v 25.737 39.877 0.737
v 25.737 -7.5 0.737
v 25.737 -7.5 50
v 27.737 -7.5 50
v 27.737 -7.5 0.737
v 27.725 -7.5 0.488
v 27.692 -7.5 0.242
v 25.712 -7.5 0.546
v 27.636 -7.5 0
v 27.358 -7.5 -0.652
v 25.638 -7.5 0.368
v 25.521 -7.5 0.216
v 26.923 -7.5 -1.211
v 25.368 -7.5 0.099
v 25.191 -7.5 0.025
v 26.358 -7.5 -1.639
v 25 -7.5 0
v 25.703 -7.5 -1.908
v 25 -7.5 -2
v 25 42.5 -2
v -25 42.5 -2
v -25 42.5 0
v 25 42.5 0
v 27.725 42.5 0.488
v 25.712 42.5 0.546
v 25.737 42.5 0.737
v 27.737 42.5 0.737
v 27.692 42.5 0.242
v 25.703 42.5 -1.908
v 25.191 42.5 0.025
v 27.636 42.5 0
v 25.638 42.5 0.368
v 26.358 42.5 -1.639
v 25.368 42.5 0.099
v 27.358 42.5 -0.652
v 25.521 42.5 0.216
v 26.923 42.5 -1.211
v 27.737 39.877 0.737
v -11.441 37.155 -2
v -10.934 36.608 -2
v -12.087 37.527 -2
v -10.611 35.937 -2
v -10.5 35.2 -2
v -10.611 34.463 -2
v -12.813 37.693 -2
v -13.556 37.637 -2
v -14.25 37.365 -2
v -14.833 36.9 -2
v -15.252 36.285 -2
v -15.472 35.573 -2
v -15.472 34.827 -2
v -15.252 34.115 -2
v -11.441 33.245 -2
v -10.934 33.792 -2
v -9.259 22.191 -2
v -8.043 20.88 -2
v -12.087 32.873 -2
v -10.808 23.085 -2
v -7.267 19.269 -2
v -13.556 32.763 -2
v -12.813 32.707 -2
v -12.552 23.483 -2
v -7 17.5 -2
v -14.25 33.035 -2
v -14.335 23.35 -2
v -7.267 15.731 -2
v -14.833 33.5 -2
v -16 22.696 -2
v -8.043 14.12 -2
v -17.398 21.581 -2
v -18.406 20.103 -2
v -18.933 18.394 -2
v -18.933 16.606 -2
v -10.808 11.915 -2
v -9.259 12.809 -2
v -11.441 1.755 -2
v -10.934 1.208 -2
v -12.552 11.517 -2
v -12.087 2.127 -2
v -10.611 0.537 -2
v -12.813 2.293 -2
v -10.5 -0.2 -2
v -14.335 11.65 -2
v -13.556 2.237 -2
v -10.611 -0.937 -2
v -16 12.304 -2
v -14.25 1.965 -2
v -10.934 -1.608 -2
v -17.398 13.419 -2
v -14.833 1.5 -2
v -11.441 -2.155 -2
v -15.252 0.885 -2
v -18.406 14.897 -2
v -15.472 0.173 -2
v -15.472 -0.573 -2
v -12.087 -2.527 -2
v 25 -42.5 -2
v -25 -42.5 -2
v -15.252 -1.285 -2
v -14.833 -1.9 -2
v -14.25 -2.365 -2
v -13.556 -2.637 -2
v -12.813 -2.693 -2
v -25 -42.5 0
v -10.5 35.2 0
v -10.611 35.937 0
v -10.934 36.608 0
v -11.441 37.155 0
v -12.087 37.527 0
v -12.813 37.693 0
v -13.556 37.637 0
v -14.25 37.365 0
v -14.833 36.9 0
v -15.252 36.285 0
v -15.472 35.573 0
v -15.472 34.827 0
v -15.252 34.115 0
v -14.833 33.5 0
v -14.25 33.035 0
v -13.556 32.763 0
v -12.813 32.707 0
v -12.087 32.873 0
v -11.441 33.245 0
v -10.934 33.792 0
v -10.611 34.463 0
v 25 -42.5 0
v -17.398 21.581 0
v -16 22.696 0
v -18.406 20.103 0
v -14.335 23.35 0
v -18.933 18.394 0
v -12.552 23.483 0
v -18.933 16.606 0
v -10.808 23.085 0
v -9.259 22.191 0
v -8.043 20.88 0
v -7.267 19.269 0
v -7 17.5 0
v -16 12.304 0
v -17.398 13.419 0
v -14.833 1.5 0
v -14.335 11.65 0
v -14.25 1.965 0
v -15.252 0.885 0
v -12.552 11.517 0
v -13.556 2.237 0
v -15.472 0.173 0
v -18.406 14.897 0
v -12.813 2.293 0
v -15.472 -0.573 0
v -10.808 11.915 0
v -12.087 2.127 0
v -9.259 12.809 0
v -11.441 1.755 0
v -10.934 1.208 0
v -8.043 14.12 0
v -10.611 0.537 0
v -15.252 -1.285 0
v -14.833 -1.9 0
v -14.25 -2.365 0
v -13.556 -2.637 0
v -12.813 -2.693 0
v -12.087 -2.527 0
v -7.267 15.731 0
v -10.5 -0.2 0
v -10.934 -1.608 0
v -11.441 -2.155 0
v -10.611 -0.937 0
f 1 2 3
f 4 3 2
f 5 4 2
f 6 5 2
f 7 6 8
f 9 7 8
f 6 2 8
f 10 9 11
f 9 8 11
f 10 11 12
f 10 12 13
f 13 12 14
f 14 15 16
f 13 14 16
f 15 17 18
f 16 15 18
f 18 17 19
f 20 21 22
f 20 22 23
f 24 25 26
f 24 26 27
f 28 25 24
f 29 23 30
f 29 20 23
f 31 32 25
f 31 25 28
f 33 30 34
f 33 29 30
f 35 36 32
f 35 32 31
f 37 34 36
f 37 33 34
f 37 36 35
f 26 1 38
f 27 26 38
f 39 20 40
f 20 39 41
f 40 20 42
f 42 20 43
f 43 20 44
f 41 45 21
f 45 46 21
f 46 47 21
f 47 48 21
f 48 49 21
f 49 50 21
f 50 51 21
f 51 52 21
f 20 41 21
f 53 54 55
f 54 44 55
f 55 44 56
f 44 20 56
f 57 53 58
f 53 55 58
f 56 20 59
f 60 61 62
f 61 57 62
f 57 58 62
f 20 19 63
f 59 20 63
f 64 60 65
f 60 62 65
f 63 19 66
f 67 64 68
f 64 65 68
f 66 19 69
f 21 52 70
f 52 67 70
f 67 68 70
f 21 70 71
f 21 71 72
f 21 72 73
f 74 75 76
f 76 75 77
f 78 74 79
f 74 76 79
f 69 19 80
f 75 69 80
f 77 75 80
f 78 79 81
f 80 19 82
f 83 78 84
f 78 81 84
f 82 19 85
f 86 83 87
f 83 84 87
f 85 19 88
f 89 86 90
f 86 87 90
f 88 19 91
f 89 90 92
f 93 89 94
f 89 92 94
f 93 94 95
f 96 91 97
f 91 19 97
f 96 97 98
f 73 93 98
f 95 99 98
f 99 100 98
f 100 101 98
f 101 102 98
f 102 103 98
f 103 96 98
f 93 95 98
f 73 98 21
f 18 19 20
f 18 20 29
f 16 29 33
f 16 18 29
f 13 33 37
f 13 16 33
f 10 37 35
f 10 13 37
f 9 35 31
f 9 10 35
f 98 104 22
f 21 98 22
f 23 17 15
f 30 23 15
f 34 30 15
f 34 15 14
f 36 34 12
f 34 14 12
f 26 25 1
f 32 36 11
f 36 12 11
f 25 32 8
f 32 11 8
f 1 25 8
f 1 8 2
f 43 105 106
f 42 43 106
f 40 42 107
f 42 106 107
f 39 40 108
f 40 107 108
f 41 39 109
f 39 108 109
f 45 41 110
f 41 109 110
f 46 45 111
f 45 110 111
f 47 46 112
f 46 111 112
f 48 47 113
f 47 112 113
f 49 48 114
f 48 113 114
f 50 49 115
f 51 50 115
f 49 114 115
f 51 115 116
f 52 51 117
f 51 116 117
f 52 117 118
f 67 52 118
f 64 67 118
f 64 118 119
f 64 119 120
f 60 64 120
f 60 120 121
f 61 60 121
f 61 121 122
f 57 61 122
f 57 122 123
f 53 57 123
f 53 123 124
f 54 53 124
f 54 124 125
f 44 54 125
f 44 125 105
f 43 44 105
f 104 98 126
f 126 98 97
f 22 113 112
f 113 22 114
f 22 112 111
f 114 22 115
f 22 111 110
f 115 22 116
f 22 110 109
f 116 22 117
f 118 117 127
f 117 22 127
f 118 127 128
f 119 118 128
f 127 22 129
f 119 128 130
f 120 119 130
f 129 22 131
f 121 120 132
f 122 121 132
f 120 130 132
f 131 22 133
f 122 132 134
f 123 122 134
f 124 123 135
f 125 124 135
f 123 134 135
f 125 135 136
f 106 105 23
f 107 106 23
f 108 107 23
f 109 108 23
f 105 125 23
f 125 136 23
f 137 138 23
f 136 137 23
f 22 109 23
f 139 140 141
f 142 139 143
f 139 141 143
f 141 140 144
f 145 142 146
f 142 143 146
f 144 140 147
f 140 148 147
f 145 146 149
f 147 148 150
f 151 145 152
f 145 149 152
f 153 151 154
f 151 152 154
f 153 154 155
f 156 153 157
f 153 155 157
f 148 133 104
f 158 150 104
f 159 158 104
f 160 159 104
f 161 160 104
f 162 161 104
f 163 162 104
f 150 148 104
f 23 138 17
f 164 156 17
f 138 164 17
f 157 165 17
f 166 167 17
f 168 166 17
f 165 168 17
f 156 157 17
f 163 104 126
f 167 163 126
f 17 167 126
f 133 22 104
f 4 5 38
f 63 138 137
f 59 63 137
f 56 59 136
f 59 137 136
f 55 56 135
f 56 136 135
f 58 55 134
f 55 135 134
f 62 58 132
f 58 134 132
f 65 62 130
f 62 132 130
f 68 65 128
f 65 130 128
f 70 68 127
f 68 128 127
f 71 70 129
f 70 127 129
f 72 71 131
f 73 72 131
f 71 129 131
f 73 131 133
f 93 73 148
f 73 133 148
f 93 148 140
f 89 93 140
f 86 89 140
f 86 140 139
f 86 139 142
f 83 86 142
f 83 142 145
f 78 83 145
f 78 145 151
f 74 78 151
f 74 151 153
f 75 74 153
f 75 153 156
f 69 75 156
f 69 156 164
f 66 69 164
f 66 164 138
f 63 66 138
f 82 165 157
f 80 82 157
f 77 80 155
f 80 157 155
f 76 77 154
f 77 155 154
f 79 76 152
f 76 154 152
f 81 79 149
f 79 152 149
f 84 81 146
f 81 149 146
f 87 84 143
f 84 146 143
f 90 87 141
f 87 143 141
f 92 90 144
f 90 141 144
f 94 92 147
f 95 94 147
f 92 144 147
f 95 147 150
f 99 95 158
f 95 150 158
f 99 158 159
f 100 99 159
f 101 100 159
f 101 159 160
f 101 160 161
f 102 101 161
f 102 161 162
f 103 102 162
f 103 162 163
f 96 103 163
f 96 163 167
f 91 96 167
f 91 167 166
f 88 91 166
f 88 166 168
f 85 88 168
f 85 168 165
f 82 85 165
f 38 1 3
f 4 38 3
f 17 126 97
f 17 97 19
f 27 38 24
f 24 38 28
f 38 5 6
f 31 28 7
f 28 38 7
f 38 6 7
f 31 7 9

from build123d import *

# Parameters (mm, degrees)
CROQUIS1_W             = 50
CROQUIS1_H             = 85
BRIDA_BASE1_DEPTH      = 2
BRIDA_DE_ARISTA1_DEPTH = 85
DESDOBLAR1_START       = -42.5
DESDOBLAR1_DEPTH       = 85
DESDOBLAR1_2_DEPTH     = 85
CROQUIS9_W             = 49.2634
CROQUIS9_H             = 35
CROQUIS9_W_2           = 2.727844901
CORTAR_EXTRUIR1_DEPTH  = 10
DOBLAR1_START          = -7.5
DOBLAR1_DEPTH          = 50
DOBLAR1_2_DEPTH        = 50
DOBLAR1_START_2        = 27.727844901
DOBLAR1_3_DEPTH        = 50.272155099
DOBLAR1_START_3        = 25.7366
DOBLAR1_4_DEPTH        = 2
CROQUIS11_R            = 6
CROQUIS11_R_2          = 2.5
CORTAR_EXTRUIR2_DEPTH  = 10


with BuildPart() as part:
    # Brida base1: sheet metal written as solids
    # Croquis1 → Brida base1 (new body)
    with BuildSketch(Plane.XY):
        Rectangle(CROQUIS1_W, CROQUIS1_H)
    extrude(amount=-BRIDA_BASE1_DEPTH)

    # Brida de arista1: sheet metal written as solids
    # Brida de arista1 section (on a plane across the edge) → Brida de arista1 (add)
    with BuildSketch(Plane(origin=(25.7366, -42.5, 0), x_dir=(-1, 0, 0), z_dir=(0, 1, 0))):
        with BuildLine():
            Line((-2, 0.7366), (-2, 50))
            Line((-2, 50), (0, 50))
            Line((0, 50), (0, 0.7366))
            ThreePointArc((0, 0.7366), (0.215745145, 0.215745145), (0.7366, 0))
            Line((0.7366, 0), (0.7366, -2))
            ThreePointArc((0.7366, -2), (-1.198468417, -1.198468417), (-2, 0.7366))
        make_face()
    extrude(amount=BRIDA_DE_ARISTA1_DEPTH)

    # Desdoblar1: read off the stored shape, not the designer's step
    # Desdoblar1 outline → Desdoblar1 (cut)
    with BuildSketch(Plane(origin=(0, 0, 0), x_dir=(1, 0, 0), z_dir=(0, 1, 0)).offset(DESDOBLAR1_START)):
        with BuildLine():
            ThreePointArc((27.7366, -0.7366), (27.711233029, -0.364854094), (27.635602398, 0))
            Line((27.635602398, 0), (25, 0))
            ThreePointArc((25, 0), (25.520854855, -0.215745145), (25.7366, -0.7366))
            Line((25.7366, -0.7366), (25.7366, -50))
            Line((25.7366, -50), (27.7366, -50))
            Line((27.7366, -50), (27.7366, -0.7366))
        make_face()
    extrude(amount=DESDOBLAR1_DEPTH, mode=Mode.SUBTRACT)

    # Desdoblar1 2 outline → Desdoblar1 2 (add)
    with BuildSketch(Plane(origin=(0, 0, 0), x_dir=(1, 0, 0), z_dir=(0, 1, 0)).offset(DESDOBLAR1_START)):
        with BuildLine():
            Line((76.991244901, 2), (25, 2))
            ThreePointArc((25, 2), (26.654267209, 1.443395312), (27.635602398, 0))
            Line((27.635602398, 0), (76.991244901, 0))
            Line((76.991244901, 0), (76.991244901, 2))
        make_face()
    extrude(amount=DESDOBLAR1_2_DEPTH)

    # Croquis9 → Cortar-Extruir1 (cut)
    with BuildSketch(Plane.XY):
        Polygon((27.727844901, 39.876630521), (76.991244901, -7.5), (76.991244901, 42.5), (27.727844901, 42.5), align=None)
        with Locations((52.359544901, -25)):
            Rectangle(CROQUIS9_W, CROQUIS9_H)
        with Locations((26.36392245, -25)):
            Rectangle(CROQUIS9_W_2, CROQUIS9_H)
    extrude(amount=-CORTAR_EXTRUIR1_DEPTH, mode=Mode.SUBTRACT)

    # Doblar1: read off the stored shape, not the designer's step
    # Doblar1 outline → Doblar1 (cut)
    with BuildSketch(Plane(origin=(0, 0, 0), x_dir=(1, 0, 0), z_dir=(0, 1, 0)).offset(DOBLAR1_START)):
        with BuildLine():
            ThreePointArc((25, 2), (26.654267209, 1.443395312), (27.635602398, 0))
            Line((27.635602398, 0), (27.727844901, 0))
            Line((27.727844901, 0), (27.727844901, 2))
            Line((27.727844901, 2), (25, 2))
        make_face()
    extrude(amount=DOBLAR1_DEPTH, mode=Mode.SUBTRACT)

    # Doblar1 2 outline → Doblar1 2 (add)
    with BuildSketch(Plane(origin=(0, 0, 0), x_dir=(1, 0, 0), z_dir=(0, 1, 0)).offset(DOBLAR1_START)):
        with BuildLine():
            ThreePointArc((25, 0), (25.520854855, -0.215745145), (25.7366, -0.7366))
            Line((25.7366, -0.7366), (27.7366, -0.7366))
            ThreePointArc((27.7366, -0.7366), (27.711233029, -0.364854094), (27.635602398, 0))
            Line((27.635602398, 0), (25, 0))
        make_face()
    extrude(amount=DOBLAR1_2_DEPTH)

    # Doblar1 3 outline → Doblar1 3 (cut)
    with BuildSketch(Plane.YZ.offset(DOBLAR1_START_2)):
        Polygon((42.508419782, -2), (40.585019021, 0), (-7.5, 0), (-7.5, -2), align=None)
    extrude(amount=DOBLAR1_3_DEPTH, mode=Mode.SUBTRACT)

    # Doblar1 4 outline → Doblar1 4 (add)
    with BuildSketch(Plane.YZ.offset(DOBLAR1_START_3)):
        Polygon((-7.5, 50), (-7.5, 0.7366), (39.876630521, 0.7366), align=None)
    extrude(amount=DOBLAR1_4_DEPTH)

    # Croquis11 → Cortar-Extruir2 (cut)
    with BuildSketch(Plane.XY):
        with Locations((-13, 17.5)):
            Circle(CROQUIS11_R)
        with Locations((-13, -0.2)):
            Circle(CROQUIS11_R_2)
        with Locations((-13, 35.2)):
            Circle(CROQUIS11_R_2)
    extrude(amount=-CORTAR_EXTRUIR2_DEPTH, mode=Mode.SUBTRACT)


solid = part.part
